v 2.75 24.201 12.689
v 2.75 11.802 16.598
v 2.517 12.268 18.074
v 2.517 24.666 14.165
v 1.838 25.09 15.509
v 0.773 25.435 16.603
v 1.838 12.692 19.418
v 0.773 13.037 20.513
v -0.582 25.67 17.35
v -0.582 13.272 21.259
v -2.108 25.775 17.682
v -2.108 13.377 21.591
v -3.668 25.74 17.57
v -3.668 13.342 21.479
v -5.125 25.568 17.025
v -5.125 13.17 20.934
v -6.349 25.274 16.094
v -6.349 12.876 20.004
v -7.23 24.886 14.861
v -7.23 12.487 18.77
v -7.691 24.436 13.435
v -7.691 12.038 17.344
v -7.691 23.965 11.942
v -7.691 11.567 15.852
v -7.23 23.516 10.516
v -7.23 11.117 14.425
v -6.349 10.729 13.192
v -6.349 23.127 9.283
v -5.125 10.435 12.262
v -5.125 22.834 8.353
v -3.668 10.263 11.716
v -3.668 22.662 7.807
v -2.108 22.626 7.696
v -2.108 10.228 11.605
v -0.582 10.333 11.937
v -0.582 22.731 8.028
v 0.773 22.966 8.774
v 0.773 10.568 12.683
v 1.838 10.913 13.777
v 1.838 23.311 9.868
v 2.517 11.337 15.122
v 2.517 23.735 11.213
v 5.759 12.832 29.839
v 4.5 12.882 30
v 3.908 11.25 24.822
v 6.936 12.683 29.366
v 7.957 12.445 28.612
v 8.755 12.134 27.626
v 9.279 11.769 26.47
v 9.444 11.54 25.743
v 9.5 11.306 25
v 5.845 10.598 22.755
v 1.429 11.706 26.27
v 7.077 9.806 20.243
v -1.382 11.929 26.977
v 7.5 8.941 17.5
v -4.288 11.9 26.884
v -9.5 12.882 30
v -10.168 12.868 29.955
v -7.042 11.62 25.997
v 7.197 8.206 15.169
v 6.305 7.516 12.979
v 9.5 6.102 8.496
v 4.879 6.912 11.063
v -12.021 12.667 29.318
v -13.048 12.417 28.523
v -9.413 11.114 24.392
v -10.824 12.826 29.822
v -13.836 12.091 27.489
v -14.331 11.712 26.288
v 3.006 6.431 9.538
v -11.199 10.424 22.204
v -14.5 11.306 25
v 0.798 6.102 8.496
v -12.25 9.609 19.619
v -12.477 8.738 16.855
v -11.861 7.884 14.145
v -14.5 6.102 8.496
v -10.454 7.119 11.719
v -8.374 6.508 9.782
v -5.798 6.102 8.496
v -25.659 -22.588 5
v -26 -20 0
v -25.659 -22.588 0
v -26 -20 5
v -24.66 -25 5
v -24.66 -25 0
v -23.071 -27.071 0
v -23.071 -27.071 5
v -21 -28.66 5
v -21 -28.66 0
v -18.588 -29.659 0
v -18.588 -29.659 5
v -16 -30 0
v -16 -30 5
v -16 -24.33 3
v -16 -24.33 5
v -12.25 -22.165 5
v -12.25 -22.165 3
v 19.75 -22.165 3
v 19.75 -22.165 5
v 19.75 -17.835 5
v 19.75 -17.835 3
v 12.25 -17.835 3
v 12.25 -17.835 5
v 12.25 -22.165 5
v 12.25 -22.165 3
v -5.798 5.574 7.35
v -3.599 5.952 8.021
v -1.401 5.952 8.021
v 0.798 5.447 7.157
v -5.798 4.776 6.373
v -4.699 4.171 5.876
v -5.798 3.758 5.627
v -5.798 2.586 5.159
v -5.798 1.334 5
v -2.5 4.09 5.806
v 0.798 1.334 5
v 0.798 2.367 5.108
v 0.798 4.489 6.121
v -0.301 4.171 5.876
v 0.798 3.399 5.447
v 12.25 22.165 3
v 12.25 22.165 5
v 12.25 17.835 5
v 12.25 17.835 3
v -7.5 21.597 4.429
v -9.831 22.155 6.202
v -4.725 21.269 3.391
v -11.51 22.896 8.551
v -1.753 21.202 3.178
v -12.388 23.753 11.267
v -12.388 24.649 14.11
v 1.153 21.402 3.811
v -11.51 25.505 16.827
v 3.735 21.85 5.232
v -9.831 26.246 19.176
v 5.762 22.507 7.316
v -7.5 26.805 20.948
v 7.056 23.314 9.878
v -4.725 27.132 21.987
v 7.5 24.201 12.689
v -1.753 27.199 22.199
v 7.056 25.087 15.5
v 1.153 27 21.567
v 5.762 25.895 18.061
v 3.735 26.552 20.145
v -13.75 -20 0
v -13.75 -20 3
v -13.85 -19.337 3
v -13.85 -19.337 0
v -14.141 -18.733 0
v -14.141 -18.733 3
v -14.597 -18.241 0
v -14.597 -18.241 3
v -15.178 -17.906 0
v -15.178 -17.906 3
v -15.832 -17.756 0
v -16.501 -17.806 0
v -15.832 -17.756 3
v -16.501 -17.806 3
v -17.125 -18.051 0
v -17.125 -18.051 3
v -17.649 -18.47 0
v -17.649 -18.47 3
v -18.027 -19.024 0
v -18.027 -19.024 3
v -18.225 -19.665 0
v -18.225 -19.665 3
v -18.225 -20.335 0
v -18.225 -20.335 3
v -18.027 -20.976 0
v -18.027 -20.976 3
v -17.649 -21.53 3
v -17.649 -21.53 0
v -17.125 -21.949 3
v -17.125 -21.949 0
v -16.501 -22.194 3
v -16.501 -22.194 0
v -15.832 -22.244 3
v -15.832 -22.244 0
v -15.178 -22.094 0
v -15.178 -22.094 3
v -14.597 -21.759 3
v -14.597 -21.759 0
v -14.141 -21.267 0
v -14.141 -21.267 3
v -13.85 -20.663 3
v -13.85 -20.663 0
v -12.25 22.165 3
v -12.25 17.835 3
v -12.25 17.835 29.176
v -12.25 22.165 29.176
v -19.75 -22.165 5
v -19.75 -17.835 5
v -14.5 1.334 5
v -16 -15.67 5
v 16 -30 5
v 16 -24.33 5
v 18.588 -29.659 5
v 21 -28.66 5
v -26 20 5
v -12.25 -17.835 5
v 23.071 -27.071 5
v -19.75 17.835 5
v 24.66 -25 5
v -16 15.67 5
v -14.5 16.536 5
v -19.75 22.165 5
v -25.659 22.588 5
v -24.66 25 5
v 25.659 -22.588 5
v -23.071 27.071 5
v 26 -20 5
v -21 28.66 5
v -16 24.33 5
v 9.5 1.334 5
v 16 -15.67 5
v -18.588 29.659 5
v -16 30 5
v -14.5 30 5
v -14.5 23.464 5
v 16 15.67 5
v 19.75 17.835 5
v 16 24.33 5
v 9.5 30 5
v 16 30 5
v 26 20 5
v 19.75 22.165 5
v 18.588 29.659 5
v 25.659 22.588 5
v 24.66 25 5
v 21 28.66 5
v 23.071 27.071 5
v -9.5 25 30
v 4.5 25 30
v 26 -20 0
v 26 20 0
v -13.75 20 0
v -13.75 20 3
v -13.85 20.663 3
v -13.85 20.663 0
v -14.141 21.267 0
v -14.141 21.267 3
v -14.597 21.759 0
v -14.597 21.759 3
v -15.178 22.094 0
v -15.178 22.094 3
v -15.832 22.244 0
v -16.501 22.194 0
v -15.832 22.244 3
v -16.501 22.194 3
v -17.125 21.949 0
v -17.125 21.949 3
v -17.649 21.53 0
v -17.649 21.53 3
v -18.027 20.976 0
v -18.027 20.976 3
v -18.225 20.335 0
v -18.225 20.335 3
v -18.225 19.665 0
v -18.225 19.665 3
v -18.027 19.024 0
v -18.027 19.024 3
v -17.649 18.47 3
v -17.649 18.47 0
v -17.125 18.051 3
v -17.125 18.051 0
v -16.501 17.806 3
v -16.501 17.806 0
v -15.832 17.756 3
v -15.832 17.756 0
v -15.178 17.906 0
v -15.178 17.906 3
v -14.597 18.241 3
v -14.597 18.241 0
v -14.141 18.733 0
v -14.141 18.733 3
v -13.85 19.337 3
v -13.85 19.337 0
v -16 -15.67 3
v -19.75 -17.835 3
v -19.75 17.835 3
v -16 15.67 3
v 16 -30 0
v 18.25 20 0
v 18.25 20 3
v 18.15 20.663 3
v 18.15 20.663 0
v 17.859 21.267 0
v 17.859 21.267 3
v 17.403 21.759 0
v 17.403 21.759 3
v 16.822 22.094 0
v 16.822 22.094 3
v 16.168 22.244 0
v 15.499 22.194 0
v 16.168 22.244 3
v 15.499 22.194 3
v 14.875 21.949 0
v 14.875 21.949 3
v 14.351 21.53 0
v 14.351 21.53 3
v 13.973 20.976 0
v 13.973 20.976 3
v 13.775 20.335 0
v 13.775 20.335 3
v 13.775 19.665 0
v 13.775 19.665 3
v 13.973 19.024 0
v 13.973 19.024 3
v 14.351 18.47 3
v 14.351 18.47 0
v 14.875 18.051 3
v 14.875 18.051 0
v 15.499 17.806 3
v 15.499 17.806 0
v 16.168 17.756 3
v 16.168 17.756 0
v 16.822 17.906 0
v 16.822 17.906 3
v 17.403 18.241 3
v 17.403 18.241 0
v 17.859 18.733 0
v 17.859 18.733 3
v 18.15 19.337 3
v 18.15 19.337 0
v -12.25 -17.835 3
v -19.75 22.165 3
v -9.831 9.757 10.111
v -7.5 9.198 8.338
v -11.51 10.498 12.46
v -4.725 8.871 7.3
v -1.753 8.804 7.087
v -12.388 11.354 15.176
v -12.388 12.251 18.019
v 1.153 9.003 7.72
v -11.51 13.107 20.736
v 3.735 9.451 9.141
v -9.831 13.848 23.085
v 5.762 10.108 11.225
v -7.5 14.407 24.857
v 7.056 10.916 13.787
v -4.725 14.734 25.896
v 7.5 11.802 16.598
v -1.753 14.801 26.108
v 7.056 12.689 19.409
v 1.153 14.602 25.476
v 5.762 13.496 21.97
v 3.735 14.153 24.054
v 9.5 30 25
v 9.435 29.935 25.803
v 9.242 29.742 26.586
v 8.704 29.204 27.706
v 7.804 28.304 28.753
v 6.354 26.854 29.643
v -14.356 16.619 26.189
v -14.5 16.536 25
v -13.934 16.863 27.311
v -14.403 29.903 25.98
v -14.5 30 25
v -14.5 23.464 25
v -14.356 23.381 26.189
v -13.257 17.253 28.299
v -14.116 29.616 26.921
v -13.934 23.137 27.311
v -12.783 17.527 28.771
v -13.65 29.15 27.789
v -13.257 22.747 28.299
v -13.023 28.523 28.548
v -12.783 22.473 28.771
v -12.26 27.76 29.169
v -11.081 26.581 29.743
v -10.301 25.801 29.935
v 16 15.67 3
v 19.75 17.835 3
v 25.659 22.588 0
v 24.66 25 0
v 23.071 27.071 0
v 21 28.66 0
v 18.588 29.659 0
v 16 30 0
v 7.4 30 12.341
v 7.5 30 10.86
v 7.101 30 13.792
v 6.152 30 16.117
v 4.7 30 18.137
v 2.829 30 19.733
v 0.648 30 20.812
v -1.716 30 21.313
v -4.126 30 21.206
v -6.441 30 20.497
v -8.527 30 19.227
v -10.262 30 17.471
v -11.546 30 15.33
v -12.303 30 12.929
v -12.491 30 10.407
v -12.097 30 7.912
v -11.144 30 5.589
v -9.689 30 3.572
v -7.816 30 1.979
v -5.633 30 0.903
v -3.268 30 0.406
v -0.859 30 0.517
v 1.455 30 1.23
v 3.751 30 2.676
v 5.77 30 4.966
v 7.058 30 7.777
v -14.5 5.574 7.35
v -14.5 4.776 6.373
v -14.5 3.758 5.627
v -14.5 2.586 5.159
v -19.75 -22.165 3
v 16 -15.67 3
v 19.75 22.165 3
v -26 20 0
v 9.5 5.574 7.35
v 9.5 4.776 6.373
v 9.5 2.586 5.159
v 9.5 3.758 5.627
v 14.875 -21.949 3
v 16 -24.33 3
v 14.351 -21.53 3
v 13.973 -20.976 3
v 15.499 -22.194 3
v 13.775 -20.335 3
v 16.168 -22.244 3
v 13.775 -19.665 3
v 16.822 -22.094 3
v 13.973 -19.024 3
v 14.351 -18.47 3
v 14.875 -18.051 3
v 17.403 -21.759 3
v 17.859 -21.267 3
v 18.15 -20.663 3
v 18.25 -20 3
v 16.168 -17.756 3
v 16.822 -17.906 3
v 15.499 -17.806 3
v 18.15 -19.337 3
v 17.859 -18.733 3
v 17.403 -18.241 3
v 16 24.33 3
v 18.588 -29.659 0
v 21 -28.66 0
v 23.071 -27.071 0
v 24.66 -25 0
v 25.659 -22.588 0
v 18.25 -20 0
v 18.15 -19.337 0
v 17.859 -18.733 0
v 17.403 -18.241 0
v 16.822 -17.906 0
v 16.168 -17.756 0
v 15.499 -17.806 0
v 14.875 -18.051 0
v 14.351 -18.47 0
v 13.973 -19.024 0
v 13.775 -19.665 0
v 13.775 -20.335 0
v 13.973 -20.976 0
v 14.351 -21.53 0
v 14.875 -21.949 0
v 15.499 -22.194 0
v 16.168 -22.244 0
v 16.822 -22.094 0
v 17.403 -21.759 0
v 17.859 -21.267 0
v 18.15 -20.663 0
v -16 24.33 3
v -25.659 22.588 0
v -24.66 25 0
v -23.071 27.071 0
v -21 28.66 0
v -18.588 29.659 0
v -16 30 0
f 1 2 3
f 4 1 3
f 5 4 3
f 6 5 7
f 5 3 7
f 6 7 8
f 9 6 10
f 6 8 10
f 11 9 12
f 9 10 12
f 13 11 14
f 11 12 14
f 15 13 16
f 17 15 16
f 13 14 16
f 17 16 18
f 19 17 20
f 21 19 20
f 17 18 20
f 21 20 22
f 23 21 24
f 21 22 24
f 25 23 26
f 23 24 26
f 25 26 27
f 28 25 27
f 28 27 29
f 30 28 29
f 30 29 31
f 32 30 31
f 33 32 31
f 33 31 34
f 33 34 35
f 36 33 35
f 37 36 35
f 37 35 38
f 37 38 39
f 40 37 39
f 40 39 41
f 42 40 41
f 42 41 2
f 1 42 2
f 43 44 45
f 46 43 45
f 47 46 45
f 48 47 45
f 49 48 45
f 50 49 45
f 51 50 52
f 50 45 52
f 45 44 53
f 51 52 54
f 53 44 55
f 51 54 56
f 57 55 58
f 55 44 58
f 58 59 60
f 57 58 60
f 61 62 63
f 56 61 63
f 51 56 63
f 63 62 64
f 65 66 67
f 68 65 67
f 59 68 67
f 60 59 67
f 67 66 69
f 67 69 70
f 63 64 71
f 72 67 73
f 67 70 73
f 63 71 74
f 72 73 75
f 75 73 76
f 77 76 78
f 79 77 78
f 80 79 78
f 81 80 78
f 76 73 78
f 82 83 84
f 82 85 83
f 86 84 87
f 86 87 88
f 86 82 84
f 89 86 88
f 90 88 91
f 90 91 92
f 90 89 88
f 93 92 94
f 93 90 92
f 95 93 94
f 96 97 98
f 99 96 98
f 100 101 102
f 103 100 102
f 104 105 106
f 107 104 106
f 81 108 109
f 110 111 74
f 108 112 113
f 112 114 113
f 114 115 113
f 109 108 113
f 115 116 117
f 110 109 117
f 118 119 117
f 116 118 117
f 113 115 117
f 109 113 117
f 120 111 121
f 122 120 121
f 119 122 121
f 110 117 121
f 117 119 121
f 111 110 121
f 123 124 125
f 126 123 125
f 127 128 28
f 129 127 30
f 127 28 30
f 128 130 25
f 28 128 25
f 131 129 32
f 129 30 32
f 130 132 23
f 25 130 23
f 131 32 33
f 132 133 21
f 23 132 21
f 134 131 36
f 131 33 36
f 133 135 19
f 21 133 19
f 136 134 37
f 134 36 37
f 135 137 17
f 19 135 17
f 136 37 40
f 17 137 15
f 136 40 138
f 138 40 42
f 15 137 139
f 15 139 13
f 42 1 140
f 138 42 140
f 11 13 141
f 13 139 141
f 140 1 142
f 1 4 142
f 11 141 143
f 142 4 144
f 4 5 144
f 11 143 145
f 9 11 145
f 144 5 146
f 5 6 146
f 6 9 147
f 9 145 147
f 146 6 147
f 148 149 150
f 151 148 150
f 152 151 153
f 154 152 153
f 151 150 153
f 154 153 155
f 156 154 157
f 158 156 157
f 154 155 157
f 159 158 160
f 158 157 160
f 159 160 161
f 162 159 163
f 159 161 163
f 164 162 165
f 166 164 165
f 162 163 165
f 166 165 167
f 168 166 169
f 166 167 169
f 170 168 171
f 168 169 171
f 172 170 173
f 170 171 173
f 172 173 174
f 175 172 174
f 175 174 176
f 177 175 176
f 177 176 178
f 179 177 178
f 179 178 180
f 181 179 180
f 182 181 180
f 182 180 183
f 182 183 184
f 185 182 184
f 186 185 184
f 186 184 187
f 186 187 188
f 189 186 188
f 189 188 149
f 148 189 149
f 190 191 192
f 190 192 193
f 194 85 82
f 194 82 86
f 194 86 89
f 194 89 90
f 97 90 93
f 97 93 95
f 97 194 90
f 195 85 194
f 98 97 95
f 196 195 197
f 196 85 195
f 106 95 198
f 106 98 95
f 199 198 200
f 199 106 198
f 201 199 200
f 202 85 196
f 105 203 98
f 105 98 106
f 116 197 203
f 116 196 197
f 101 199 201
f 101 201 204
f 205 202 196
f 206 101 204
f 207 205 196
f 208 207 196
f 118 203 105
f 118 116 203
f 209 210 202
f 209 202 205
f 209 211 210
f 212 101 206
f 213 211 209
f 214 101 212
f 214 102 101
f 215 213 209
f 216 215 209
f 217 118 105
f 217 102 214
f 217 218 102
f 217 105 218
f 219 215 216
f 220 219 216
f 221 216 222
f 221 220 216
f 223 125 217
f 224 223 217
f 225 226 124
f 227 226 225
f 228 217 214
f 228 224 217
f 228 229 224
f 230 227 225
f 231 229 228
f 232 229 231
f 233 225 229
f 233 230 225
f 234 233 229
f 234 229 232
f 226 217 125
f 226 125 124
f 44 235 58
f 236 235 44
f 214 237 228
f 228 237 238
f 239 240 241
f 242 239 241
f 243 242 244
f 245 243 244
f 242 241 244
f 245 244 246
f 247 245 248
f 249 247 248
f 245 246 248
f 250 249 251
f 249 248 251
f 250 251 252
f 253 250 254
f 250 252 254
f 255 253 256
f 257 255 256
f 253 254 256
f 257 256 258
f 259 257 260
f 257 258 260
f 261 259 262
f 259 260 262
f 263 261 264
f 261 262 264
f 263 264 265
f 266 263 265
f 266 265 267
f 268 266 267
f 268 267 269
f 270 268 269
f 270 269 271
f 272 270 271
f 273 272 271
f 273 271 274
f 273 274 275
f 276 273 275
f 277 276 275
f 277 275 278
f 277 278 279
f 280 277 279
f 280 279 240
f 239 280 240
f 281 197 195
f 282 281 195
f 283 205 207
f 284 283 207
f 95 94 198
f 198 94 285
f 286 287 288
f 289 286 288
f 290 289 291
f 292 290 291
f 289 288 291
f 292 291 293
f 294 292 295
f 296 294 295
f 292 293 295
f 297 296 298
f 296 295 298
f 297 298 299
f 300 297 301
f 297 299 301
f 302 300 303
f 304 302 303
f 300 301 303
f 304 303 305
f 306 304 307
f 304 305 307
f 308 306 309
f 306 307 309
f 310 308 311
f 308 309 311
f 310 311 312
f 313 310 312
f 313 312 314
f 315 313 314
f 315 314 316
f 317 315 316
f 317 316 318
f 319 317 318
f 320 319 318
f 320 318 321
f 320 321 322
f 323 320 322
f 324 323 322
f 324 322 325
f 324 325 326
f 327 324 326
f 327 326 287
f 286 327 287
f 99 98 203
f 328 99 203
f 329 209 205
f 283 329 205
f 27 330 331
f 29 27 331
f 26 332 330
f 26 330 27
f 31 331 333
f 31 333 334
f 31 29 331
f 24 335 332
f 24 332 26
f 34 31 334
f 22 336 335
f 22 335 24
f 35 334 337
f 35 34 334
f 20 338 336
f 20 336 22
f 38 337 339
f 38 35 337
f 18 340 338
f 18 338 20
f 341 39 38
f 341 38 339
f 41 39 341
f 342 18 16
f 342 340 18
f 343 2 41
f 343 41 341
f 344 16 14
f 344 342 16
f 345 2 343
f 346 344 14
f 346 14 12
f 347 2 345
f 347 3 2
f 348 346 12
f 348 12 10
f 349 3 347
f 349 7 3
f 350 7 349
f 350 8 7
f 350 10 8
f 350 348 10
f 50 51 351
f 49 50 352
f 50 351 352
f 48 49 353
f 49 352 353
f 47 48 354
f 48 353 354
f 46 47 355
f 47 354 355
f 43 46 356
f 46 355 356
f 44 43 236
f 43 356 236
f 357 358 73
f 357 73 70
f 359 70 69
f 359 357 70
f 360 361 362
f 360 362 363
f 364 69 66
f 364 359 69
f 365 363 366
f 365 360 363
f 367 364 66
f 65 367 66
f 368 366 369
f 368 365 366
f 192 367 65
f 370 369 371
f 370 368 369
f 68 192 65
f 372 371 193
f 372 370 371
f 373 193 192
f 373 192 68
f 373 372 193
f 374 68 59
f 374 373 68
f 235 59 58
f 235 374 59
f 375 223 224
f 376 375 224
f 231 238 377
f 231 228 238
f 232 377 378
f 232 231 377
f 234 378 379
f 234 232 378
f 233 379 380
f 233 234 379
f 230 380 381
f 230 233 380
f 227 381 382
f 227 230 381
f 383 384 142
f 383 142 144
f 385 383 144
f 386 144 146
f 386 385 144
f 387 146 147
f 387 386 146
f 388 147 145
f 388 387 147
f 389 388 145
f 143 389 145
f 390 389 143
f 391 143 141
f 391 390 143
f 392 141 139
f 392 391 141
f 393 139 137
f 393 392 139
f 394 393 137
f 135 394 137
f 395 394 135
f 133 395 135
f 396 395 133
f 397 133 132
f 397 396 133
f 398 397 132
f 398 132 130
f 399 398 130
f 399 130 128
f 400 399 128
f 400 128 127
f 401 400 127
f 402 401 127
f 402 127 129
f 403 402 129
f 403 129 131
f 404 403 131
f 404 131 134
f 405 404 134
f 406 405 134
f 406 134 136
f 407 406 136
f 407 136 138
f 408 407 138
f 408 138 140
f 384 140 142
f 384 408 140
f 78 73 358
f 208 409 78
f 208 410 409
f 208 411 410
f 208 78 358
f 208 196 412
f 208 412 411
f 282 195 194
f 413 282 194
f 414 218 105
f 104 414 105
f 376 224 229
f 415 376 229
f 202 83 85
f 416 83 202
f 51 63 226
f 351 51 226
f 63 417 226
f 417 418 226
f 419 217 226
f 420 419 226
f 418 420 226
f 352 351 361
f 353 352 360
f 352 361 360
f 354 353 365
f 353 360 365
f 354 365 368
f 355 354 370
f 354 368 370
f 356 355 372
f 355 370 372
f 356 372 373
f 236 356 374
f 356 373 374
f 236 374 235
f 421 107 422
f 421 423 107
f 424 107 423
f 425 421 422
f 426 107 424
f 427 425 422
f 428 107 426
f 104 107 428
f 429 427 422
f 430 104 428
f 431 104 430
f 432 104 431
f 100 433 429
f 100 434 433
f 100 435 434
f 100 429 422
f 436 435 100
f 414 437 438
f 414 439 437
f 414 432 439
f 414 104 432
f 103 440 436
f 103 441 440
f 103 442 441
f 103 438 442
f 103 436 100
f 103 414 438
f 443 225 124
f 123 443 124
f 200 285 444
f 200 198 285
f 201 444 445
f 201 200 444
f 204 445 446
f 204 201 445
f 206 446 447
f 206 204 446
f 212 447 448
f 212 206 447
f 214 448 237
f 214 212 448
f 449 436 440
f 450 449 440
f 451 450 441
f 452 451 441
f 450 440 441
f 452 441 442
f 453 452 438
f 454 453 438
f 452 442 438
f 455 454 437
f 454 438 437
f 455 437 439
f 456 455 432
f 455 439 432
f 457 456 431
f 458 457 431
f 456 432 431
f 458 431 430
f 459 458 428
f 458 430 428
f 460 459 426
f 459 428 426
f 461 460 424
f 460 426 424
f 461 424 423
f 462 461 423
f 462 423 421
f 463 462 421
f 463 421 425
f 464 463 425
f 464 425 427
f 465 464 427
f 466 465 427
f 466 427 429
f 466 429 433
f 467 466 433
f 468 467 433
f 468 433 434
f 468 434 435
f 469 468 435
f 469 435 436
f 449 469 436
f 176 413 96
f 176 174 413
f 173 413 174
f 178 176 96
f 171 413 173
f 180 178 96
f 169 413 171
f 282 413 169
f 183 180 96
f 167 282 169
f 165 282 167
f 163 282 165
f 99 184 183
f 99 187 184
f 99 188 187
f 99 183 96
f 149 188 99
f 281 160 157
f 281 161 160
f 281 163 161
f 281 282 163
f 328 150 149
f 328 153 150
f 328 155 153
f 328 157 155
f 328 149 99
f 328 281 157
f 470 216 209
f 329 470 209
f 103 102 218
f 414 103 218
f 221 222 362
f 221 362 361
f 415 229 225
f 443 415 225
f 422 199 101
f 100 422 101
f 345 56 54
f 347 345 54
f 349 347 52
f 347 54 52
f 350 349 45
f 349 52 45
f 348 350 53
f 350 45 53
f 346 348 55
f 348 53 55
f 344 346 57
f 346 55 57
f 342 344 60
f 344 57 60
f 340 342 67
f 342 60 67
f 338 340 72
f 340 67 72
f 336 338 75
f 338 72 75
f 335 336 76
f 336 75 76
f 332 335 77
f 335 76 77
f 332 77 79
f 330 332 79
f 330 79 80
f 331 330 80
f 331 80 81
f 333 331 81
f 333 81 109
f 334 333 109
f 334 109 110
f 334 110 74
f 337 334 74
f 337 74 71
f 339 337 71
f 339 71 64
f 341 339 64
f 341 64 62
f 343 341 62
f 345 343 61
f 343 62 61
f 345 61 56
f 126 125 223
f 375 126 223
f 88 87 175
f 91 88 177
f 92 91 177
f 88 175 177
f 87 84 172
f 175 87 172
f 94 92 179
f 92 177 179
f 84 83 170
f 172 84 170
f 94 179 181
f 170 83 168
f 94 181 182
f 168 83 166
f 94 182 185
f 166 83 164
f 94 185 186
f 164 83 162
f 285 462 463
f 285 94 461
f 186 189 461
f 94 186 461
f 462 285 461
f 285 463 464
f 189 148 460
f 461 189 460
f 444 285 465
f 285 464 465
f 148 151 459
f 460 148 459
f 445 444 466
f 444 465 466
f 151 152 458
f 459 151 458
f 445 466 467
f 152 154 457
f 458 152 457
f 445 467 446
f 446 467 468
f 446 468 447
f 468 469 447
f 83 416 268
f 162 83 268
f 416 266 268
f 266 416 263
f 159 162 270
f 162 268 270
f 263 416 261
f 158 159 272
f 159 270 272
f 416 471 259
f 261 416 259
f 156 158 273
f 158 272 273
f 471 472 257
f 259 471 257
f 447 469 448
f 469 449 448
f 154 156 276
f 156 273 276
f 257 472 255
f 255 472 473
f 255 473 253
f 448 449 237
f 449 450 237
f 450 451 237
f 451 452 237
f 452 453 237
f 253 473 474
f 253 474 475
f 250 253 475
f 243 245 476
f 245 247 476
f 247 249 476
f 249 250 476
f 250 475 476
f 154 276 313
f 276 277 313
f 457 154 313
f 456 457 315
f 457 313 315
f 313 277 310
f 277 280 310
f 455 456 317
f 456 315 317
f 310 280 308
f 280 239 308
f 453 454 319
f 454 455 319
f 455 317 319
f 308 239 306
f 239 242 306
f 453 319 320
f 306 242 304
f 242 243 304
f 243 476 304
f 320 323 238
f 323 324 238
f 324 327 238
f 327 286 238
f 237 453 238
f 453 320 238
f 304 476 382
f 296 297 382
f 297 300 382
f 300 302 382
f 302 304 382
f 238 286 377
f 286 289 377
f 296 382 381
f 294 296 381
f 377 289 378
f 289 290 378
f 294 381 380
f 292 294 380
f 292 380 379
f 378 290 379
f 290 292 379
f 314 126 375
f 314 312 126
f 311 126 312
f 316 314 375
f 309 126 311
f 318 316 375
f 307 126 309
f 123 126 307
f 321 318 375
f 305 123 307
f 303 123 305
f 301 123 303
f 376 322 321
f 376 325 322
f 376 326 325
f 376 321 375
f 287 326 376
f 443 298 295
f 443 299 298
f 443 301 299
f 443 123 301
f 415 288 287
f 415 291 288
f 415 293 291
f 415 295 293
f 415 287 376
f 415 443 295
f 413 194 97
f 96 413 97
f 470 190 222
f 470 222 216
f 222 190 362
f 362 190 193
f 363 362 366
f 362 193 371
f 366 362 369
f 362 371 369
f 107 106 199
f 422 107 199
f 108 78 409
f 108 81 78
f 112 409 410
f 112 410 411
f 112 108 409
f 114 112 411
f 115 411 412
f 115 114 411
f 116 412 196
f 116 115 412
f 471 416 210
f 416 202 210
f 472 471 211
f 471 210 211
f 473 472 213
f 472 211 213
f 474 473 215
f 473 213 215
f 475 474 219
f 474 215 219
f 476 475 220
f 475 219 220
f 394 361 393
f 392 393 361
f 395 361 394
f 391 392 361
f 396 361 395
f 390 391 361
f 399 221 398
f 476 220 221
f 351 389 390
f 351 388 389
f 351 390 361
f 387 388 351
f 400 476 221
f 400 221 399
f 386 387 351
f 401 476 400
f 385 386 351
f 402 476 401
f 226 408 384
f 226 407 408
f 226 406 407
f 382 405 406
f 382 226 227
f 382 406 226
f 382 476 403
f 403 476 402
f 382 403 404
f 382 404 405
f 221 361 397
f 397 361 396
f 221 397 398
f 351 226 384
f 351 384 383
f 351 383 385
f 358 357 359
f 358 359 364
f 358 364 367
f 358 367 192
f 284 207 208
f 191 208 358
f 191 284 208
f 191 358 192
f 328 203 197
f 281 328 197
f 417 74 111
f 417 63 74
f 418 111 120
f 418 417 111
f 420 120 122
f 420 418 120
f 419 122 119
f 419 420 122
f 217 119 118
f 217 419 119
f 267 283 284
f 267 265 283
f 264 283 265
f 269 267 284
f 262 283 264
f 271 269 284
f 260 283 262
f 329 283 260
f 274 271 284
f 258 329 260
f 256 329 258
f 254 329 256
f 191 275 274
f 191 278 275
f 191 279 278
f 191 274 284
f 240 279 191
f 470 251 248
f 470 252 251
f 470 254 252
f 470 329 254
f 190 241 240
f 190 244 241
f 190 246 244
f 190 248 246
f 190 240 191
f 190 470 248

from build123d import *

# Parameters (mm, degrees)
F0_W         = 52
F0_H         = 60
F1_DEPTH     = 5
F2_R         = 10
F3_R         = 2.25
F4_DEPTH     = 25
F6_DEPTH     = 2
F7_W         = 24
F7_H         = 25
F8_DEPTH     = 25
F10_DEPTH    = 40.501
F11_R        = 5.25
F12_DEPTH    = 25.3474527662
F13_R        = 10
F13_R_2      = 5.25
F14_DEPTH    = 3
F16_R        = 10
F17_DEPTH    = 12
F18_DEPTH    = 25.001
F19_F1_R     = 5
F19_T2_DEPTH = 31.5358983849
F19_T4_DEPTH = 28.6534286629
F19_T6_DEPTH = 42.117530278
F19_T8_DEPTH = 49


# Not quite as in the source:
# - a fillet or chamfer that OpenCascade refuses, or shapes differently, is made with other operations: its cross-section is extruded or revolved along the edge and cut away or added


with BuildPart() as f1:
    # F0 (on Top) → F1 (new body)
    with BuildSketch(Plane.XY):
        Rectangle(F0_W, F0_H)
    extrude(amount=F1_DEPTH)

    # F2
    f2_edges = [f1.edges().sort_by_distance(p)[0] for p in [
        (26, -30, 2.5),
        (-26, -30, 2.5),
        (26, 30, 2.5),
        (-26, 30, 2.5),
    ]]
    fillet(f2_edges, radius=F2_R)

    # F3 (on face) → F4 (cut)
    with BuildSketch(Plane.XY.offset(5)):
        with Locations((-16, -20)):
            Circle(F3_R)
        with Locations((16, -20)):
            Circle(F3_R)
        with Locations((-16, 20)):
            Circle(F3_R)
        with Locations((16, 20)):
            Circle(F3_R)
    extrude(amount=-F4_DEPTH, mode=Mode.SUBTRACT)

    # F5 (on face) → F6 (cut)
    with BuildSketch(Plane.XY.offset(5)):
        Polygon((-16, -15.6698729811), (-19.75, -17.8349364905), (-19.75, -22.1650635095), (-16, -24.3301270189), (-12.25, -22.1650635095), (-12.25, -17.8349364905), align=None)
        Polygon((-12.25, 22.1650635095), (-16, 24.3301270189), (-19.75, 22.1650635095), (-19.75, 17.8349364905), (-16, 15.6698729811), (-12.25, 17.8349364905), align=None)
        Polygon((19.75, -17.8349364905), (16, -15.6698729811), (12.25, -17.8349364905), (12.25, -22.1650635095), (16, -24.3301270189), (19.75, -22.1650635095), align=None)
        Polygon((19.75, 22.1650635095), (16, 24.3301270189), (12.25, 22.1650635095), (12.25, 17.8349364905), (16, 15.6698729811), (19.75, 17.8349364905), align=None)
    extrude(amount=-F6_DEPTH, mode=Mode.SUBTRACT)

    # F7 (on face) → F8 (join)
    with BuildSketch(Plane.XY.offset(5)):
        with Locations((-2.5, 17.5)):
            Rectangle(F7_W, F7_H)
    extrude(amount=F8_DEPTH)

    # F9 (on face) → F10 (cut, through all)
    with BuildSketch(Plane(origin=(-14.5, 0, 0), x_dir=(0, -1, 0), z_dir=(-1, 0, 0))):
        Polygon((-12.882469722, 30), (-5, 5), (-5, 30), align=None)
    extrude(amount=-F10_DEPTH, mode=Mode.SUBTRACT)

    # F11 (on face) → F12 (cut, through all)
    with BuildSketch(Plane(origin=(0, 3.1139390198, -0.9818212016), x_dir=(1, 0, 0), z_dir=(0, -0.9537169507, 0.3007057995))):
        with Locations((-2.5, 19.3787278155)):
            Circle(F11_R)
    extrude(amount=-F12_DEPTH, mode=Mode.SUBTRACT)

    # F13 (on face) → F14 (cut)
    with BuildSketch(Plane(origin=(0, 3.1139390198, -0.9818212016), x_dir=(1, 0, 0), z_dir=(0, -0.9537169507, 0.3007057995))):
        with Locations((-2.5, 19.3787278155)):
            Circle(F13_R)
        with Locations((-2.5, 19.3787278155)):
            Circle(F13_R_2, mode=Mode.SUBTRACT)
    extrude(amount=-F14_DEPTH, mode=Mode.SUBTRACT)

    # F16 (on offset) → F17 (cut)
    with BuildSketch(Plane(origin=(0, 29.8180136408, -9.4015835877), x_dir=(1, 0, 0), z_dir=(0, -0.9537169507, 0.3007057995))):
        with Locations((-2.5, 19.3787278155)):
            Circle(F16_R)
    extrude(amount=F17_DEPTH, mode=Mode.SUBTRACT)

    # F5 (on face) → F18 (cut, through all)
    with BuildSketch(Plane.XY.offset(5)):
        Polygon((-16, -15.6698729811), (-19.75, -17.8349364905), (-19.75, -22.1650635095), (-16, -24.3301270189), (-12.25, -22.1650635095), (-12.25, -17.8349364905), align=None)
        Polygon((-12.25, 22.1650635095), (-16, 24.3301270189), (-19.75, 22.1650635095), (-19.75, 17.8349364905), (-16, 15.6698729811), (-12.25, 17.8349364905), align=None)
        Polygon((19.75, -17.8349364905), (16, -15.6698729811), (12.25, -17.8349364905), (12.25, -22.1650635095), (16, -24.3301270189), (19.75, -22.1650635095), align=None)
        Polygon((19.75, 22.1650635095), (16, 24.3301270189), (12.25, 22.1650635095), (12.25, 17.8349364905), (16, 15.6698729811), (19.75, 17.8349364905), align=None)
    extrude(amount=F18_DEPTH, mode=Mode.SUBTRACT)

    # F19: fillet of radius 5 on 5 edges, made by hand

    # F19_f1
    f19_f1_edges = [f1.edges().sort_by_distance(p)[0] for p in [
        (-2.5, 5, 5),
    ]]
    fillet(f19_f1_edges, radius=F19_F1_R)

    # F19_s3 → F19_t2 (cut)
    with BuildSketch(Plane.XZ.offset(-42.5)):
        with BuildLine():
            ThreePointArc((-14.5, 25), (-13.0355339059, 28.5355339059), (-9.5, 30))
            Line((-9.5, 30), (-9.5, 30.1))
            Line((-9.5, 30.1), (-14.6, 30.1))
            Line((-14.6, 30.1), (-14.6, 25))
            Line((-14.6, 25), (-14.5, 25))
        make_face()
    extrude(amount=F19_T2_DEPTH, mode=Mode.SUBTRACT)

    # F19_s5 → F19_t4 (cut)
    with BuildSketch(Plane.XZ.offset(-29.0358983849)):
        with BuildLine():
            ThreePointArc((-14.5, 25), (-13.0355339059, 28.5355339059), (-9.5, 30))
            Line((-9.5, 30), (-9.5, 30.1))
            Line((-9.5, 30.1), (-14.6, 30.1))
            Line((-14.6, 30.1), (-14.6, 25))
            Line((-14.6, 25), (-14.5, 25))
        make_face()
    extrude(amount=F19_T4_DEPTH, mode=Mode.SUBTRACT)

    # F19_s7 → F19_t6 (cut)
    with BuildSketch(Plane.XZ.offset(-42.5)):
        with BuildLine():
            ThreePointArc((9.5, 25), (8.0355339059, 28.5355339059), (4.5, 30))
            Line((4.5, 30), (4.5, 30.1))
            Line((4.5, 30.1), (9.6, 30.1))
            Line((9.6, 30.1), (9.6, 25))
            Line((9.6, 25), (9.5, 25))
        make_face()
    extrude(amount=F19_T6_DEPTH, mode=Mode.SUBTRACT)

    # F19_s9 → F19_t8 (cut)
    with BuildSketch(Plane.YZ.offset(-27)):
        with BuildLine():
            ThreePointArc((30, 25), (28.5355339059, 28.5355339059), (25, 30))
            Line((25, 30), (25, 30.1))
            Line((25, 30.1), (30.1, 30.1))
            Line((30.1, 30.1), (30.1, 25))
            Line((30.1, 25), (30, 25))
        make_face()
    extrude(amount=F19_T8_DEPTH, mode=Mode.SUBTRACT)


solid = f1.part
